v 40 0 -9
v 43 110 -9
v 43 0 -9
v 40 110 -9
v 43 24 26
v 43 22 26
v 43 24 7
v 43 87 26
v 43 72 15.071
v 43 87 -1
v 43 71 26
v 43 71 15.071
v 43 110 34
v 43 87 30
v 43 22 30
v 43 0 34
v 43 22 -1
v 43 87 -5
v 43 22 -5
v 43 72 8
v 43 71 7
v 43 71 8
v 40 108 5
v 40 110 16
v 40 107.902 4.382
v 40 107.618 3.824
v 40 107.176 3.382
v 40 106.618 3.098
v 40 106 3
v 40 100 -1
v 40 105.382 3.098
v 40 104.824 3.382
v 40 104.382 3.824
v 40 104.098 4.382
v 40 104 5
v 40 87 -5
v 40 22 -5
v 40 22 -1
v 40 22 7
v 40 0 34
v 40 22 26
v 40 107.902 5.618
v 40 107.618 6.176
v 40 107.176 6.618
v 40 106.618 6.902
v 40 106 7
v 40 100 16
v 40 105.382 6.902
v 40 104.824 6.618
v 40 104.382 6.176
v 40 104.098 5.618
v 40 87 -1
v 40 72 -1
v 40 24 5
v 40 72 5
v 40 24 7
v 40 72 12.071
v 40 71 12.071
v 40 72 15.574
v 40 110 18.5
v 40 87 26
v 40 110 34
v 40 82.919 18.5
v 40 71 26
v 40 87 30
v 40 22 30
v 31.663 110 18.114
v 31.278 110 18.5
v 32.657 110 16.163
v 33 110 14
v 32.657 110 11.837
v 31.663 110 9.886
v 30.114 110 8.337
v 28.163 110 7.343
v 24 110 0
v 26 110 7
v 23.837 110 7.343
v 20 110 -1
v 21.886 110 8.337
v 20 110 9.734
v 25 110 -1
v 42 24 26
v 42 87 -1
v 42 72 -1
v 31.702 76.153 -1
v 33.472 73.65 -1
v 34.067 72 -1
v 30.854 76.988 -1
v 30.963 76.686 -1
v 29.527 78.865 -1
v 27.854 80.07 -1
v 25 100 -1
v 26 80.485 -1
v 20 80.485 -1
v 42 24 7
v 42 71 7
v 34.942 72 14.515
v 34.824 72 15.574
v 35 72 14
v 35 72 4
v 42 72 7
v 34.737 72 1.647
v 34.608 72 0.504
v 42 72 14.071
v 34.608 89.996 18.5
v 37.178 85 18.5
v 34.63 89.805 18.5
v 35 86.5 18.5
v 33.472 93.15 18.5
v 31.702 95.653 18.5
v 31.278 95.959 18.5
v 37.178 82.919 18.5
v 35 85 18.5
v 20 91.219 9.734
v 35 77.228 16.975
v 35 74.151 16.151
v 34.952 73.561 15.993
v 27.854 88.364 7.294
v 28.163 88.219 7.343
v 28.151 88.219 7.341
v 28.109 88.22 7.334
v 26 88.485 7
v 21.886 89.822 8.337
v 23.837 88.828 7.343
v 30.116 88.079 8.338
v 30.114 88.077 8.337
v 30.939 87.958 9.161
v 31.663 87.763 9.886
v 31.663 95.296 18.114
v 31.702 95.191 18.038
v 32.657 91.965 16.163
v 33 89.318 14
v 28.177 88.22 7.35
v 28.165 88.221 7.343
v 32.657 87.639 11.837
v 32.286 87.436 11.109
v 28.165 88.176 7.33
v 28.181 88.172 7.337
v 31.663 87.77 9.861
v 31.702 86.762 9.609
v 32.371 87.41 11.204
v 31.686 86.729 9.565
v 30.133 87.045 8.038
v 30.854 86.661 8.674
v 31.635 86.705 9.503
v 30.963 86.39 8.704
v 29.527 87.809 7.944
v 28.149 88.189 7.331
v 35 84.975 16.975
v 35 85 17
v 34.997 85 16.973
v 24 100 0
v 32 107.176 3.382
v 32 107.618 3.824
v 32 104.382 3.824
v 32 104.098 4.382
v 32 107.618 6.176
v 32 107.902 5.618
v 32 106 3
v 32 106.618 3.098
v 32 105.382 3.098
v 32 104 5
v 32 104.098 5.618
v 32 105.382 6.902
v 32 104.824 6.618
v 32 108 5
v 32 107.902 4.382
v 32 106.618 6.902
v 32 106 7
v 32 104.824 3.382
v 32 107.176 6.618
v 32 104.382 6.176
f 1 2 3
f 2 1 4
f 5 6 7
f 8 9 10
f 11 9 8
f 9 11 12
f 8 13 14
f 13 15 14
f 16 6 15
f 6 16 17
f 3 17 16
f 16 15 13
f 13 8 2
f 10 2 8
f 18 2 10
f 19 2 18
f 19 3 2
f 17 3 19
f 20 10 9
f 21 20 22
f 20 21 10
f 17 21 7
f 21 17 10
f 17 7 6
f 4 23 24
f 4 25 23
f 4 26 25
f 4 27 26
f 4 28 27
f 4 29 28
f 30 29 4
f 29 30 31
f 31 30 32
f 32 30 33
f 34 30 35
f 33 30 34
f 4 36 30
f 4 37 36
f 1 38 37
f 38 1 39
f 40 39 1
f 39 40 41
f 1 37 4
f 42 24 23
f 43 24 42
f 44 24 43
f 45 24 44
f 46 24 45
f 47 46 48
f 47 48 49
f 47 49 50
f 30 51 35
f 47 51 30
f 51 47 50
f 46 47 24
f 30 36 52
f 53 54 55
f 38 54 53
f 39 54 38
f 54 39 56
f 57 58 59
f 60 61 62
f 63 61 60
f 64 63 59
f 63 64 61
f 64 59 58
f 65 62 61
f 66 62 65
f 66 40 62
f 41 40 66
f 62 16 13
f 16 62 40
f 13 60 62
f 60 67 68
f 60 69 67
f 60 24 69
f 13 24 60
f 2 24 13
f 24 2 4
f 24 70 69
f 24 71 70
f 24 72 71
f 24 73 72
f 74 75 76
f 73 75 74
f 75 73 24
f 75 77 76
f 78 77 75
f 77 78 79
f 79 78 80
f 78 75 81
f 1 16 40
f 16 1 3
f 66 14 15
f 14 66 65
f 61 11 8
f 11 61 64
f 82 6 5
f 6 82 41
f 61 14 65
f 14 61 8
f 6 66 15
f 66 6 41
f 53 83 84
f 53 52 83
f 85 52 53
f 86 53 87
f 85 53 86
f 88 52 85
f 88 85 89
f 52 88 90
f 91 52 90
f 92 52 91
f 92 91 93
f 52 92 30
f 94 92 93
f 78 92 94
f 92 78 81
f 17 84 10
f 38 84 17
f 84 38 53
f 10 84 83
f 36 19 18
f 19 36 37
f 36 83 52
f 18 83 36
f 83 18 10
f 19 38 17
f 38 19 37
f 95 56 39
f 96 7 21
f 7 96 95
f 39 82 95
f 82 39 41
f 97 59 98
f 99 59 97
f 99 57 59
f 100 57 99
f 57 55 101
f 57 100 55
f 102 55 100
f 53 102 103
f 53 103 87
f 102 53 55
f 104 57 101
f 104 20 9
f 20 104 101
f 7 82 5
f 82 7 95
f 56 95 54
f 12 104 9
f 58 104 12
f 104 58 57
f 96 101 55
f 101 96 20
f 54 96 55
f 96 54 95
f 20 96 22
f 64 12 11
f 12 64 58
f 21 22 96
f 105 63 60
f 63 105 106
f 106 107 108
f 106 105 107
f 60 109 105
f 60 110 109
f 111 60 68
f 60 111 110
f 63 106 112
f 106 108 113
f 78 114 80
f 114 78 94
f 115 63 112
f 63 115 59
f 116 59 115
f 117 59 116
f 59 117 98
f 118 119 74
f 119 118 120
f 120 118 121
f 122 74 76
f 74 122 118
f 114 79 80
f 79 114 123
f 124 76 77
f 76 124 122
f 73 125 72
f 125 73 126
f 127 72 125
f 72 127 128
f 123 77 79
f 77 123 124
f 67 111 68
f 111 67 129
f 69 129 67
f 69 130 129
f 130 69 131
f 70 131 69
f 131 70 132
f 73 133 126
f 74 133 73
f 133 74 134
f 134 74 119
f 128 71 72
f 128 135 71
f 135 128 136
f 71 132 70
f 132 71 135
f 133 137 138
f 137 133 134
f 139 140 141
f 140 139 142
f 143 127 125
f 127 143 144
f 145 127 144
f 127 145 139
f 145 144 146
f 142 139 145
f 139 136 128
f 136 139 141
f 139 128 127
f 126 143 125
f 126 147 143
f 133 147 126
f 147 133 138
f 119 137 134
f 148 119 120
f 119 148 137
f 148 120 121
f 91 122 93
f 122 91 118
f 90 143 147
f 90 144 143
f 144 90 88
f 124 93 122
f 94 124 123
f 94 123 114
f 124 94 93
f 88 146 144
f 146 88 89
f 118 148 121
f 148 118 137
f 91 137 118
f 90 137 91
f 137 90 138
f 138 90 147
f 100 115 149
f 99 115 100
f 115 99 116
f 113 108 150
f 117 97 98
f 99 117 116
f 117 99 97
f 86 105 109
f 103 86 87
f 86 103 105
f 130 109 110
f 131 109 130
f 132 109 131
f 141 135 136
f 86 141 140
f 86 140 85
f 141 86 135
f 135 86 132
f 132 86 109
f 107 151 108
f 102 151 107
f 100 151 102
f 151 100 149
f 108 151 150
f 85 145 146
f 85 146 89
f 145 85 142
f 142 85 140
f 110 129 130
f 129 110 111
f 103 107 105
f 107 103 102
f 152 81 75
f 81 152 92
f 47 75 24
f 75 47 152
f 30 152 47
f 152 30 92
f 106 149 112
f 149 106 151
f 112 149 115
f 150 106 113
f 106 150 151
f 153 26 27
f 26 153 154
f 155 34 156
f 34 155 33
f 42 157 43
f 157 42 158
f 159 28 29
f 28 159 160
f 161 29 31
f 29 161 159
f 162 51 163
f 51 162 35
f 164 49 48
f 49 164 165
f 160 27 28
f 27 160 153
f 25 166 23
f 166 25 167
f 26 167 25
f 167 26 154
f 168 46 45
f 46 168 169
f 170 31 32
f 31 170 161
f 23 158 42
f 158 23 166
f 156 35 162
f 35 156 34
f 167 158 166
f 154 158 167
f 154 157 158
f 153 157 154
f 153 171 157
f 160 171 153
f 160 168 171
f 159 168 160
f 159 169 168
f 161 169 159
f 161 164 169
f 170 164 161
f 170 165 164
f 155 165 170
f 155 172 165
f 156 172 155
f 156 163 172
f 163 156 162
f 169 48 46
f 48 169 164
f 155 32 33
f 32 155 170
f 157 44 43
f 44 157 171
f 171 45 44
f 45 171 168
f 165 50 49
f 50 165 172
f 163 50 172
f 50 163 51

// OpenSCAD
$fn=20;







translate([0,0,0]){
union(){            //left plate.
difference(){
rotate([0,90,0]){
translate([-34,0,40]){
cube([43,110,3]);
}}
translate([35,22,26]){
cube([10,65,4]);
}
translate([35,22,-5]){
cube([10,65,4]);
}
translate([39,21,7]){//ejecting hole no catch
rotate([0,0,45]){
cube([6,48,20]);
}}
translate([37,24,2]){//ejecting hole ramp
rotate([0,-45,0]){
cube([30,48,5]);
}}
translate([37,24,7]){//ejecting hole
cube([30,47,20]);
}}
translate([32,106,5]){ // hook
rotate([0,90,0]){
    cylinder(9,r=2,2);
}}
difference(){
translate([30,40,1]){
difference(){
translate([-10,32,-2]){  // move barrel
    cube([22,38,19.5]); // barrel
}
translate([-1,0,6]){ // ramp
    rotate([15,0,0]){
    cube([29,50,10]);
}}
translate([-2,0,2]){   // cylinder
hull(){
rotate([0,90,90]){
translate([-11,2,28]){
    cylinder(90,r=7,7);
}}
rotate([0,90,90]){
translate([-31,29,28]){
    cylinder(90,r=7,7);
}}}}}}
translate([26,50,4]){ // bore
rotate([0,90,90]){
rotate([0,-15,0]){
    cylinder(38,r=7,8);
}}}

hull(){
translate([26,33,-40]){  // cut away from barrel too another notch out
rotate([0,45,90]){
    cylinder(90,r=6,6);
}}
translate([20,33,-40]){  // cut away from barrel too another notch out
rotate([0,45,90]){
    cylinder(90,r=6,6);
}}
}


hull(){
translate([27,28,-40]){  // cut away from barrel
rotate([0,45,90]){
    cylinder(90,r=8,8);
}}
translate([27,18,-40]){  // cut away from barrel
rotate([0,45,90]){
    cylinder(90,r=8,8);
}}
translate([10,28,-40]){  // cut away from barrel part 2
rotate([0,45,90]){
    cylinder(90,r=8,8);
}}}
translate([14,65,7.5]){  // clean up bore
cube([10,10,10]);
}
translate([24,100,0]){  // clean up hook
rotate([0,45,0]){
cube([20,30,30]);
}}
translate([36,55,25]){ // ejecting arm hole
rotate([0,145,0]){ 
    cube([17,30,6]);
}}
}}}
